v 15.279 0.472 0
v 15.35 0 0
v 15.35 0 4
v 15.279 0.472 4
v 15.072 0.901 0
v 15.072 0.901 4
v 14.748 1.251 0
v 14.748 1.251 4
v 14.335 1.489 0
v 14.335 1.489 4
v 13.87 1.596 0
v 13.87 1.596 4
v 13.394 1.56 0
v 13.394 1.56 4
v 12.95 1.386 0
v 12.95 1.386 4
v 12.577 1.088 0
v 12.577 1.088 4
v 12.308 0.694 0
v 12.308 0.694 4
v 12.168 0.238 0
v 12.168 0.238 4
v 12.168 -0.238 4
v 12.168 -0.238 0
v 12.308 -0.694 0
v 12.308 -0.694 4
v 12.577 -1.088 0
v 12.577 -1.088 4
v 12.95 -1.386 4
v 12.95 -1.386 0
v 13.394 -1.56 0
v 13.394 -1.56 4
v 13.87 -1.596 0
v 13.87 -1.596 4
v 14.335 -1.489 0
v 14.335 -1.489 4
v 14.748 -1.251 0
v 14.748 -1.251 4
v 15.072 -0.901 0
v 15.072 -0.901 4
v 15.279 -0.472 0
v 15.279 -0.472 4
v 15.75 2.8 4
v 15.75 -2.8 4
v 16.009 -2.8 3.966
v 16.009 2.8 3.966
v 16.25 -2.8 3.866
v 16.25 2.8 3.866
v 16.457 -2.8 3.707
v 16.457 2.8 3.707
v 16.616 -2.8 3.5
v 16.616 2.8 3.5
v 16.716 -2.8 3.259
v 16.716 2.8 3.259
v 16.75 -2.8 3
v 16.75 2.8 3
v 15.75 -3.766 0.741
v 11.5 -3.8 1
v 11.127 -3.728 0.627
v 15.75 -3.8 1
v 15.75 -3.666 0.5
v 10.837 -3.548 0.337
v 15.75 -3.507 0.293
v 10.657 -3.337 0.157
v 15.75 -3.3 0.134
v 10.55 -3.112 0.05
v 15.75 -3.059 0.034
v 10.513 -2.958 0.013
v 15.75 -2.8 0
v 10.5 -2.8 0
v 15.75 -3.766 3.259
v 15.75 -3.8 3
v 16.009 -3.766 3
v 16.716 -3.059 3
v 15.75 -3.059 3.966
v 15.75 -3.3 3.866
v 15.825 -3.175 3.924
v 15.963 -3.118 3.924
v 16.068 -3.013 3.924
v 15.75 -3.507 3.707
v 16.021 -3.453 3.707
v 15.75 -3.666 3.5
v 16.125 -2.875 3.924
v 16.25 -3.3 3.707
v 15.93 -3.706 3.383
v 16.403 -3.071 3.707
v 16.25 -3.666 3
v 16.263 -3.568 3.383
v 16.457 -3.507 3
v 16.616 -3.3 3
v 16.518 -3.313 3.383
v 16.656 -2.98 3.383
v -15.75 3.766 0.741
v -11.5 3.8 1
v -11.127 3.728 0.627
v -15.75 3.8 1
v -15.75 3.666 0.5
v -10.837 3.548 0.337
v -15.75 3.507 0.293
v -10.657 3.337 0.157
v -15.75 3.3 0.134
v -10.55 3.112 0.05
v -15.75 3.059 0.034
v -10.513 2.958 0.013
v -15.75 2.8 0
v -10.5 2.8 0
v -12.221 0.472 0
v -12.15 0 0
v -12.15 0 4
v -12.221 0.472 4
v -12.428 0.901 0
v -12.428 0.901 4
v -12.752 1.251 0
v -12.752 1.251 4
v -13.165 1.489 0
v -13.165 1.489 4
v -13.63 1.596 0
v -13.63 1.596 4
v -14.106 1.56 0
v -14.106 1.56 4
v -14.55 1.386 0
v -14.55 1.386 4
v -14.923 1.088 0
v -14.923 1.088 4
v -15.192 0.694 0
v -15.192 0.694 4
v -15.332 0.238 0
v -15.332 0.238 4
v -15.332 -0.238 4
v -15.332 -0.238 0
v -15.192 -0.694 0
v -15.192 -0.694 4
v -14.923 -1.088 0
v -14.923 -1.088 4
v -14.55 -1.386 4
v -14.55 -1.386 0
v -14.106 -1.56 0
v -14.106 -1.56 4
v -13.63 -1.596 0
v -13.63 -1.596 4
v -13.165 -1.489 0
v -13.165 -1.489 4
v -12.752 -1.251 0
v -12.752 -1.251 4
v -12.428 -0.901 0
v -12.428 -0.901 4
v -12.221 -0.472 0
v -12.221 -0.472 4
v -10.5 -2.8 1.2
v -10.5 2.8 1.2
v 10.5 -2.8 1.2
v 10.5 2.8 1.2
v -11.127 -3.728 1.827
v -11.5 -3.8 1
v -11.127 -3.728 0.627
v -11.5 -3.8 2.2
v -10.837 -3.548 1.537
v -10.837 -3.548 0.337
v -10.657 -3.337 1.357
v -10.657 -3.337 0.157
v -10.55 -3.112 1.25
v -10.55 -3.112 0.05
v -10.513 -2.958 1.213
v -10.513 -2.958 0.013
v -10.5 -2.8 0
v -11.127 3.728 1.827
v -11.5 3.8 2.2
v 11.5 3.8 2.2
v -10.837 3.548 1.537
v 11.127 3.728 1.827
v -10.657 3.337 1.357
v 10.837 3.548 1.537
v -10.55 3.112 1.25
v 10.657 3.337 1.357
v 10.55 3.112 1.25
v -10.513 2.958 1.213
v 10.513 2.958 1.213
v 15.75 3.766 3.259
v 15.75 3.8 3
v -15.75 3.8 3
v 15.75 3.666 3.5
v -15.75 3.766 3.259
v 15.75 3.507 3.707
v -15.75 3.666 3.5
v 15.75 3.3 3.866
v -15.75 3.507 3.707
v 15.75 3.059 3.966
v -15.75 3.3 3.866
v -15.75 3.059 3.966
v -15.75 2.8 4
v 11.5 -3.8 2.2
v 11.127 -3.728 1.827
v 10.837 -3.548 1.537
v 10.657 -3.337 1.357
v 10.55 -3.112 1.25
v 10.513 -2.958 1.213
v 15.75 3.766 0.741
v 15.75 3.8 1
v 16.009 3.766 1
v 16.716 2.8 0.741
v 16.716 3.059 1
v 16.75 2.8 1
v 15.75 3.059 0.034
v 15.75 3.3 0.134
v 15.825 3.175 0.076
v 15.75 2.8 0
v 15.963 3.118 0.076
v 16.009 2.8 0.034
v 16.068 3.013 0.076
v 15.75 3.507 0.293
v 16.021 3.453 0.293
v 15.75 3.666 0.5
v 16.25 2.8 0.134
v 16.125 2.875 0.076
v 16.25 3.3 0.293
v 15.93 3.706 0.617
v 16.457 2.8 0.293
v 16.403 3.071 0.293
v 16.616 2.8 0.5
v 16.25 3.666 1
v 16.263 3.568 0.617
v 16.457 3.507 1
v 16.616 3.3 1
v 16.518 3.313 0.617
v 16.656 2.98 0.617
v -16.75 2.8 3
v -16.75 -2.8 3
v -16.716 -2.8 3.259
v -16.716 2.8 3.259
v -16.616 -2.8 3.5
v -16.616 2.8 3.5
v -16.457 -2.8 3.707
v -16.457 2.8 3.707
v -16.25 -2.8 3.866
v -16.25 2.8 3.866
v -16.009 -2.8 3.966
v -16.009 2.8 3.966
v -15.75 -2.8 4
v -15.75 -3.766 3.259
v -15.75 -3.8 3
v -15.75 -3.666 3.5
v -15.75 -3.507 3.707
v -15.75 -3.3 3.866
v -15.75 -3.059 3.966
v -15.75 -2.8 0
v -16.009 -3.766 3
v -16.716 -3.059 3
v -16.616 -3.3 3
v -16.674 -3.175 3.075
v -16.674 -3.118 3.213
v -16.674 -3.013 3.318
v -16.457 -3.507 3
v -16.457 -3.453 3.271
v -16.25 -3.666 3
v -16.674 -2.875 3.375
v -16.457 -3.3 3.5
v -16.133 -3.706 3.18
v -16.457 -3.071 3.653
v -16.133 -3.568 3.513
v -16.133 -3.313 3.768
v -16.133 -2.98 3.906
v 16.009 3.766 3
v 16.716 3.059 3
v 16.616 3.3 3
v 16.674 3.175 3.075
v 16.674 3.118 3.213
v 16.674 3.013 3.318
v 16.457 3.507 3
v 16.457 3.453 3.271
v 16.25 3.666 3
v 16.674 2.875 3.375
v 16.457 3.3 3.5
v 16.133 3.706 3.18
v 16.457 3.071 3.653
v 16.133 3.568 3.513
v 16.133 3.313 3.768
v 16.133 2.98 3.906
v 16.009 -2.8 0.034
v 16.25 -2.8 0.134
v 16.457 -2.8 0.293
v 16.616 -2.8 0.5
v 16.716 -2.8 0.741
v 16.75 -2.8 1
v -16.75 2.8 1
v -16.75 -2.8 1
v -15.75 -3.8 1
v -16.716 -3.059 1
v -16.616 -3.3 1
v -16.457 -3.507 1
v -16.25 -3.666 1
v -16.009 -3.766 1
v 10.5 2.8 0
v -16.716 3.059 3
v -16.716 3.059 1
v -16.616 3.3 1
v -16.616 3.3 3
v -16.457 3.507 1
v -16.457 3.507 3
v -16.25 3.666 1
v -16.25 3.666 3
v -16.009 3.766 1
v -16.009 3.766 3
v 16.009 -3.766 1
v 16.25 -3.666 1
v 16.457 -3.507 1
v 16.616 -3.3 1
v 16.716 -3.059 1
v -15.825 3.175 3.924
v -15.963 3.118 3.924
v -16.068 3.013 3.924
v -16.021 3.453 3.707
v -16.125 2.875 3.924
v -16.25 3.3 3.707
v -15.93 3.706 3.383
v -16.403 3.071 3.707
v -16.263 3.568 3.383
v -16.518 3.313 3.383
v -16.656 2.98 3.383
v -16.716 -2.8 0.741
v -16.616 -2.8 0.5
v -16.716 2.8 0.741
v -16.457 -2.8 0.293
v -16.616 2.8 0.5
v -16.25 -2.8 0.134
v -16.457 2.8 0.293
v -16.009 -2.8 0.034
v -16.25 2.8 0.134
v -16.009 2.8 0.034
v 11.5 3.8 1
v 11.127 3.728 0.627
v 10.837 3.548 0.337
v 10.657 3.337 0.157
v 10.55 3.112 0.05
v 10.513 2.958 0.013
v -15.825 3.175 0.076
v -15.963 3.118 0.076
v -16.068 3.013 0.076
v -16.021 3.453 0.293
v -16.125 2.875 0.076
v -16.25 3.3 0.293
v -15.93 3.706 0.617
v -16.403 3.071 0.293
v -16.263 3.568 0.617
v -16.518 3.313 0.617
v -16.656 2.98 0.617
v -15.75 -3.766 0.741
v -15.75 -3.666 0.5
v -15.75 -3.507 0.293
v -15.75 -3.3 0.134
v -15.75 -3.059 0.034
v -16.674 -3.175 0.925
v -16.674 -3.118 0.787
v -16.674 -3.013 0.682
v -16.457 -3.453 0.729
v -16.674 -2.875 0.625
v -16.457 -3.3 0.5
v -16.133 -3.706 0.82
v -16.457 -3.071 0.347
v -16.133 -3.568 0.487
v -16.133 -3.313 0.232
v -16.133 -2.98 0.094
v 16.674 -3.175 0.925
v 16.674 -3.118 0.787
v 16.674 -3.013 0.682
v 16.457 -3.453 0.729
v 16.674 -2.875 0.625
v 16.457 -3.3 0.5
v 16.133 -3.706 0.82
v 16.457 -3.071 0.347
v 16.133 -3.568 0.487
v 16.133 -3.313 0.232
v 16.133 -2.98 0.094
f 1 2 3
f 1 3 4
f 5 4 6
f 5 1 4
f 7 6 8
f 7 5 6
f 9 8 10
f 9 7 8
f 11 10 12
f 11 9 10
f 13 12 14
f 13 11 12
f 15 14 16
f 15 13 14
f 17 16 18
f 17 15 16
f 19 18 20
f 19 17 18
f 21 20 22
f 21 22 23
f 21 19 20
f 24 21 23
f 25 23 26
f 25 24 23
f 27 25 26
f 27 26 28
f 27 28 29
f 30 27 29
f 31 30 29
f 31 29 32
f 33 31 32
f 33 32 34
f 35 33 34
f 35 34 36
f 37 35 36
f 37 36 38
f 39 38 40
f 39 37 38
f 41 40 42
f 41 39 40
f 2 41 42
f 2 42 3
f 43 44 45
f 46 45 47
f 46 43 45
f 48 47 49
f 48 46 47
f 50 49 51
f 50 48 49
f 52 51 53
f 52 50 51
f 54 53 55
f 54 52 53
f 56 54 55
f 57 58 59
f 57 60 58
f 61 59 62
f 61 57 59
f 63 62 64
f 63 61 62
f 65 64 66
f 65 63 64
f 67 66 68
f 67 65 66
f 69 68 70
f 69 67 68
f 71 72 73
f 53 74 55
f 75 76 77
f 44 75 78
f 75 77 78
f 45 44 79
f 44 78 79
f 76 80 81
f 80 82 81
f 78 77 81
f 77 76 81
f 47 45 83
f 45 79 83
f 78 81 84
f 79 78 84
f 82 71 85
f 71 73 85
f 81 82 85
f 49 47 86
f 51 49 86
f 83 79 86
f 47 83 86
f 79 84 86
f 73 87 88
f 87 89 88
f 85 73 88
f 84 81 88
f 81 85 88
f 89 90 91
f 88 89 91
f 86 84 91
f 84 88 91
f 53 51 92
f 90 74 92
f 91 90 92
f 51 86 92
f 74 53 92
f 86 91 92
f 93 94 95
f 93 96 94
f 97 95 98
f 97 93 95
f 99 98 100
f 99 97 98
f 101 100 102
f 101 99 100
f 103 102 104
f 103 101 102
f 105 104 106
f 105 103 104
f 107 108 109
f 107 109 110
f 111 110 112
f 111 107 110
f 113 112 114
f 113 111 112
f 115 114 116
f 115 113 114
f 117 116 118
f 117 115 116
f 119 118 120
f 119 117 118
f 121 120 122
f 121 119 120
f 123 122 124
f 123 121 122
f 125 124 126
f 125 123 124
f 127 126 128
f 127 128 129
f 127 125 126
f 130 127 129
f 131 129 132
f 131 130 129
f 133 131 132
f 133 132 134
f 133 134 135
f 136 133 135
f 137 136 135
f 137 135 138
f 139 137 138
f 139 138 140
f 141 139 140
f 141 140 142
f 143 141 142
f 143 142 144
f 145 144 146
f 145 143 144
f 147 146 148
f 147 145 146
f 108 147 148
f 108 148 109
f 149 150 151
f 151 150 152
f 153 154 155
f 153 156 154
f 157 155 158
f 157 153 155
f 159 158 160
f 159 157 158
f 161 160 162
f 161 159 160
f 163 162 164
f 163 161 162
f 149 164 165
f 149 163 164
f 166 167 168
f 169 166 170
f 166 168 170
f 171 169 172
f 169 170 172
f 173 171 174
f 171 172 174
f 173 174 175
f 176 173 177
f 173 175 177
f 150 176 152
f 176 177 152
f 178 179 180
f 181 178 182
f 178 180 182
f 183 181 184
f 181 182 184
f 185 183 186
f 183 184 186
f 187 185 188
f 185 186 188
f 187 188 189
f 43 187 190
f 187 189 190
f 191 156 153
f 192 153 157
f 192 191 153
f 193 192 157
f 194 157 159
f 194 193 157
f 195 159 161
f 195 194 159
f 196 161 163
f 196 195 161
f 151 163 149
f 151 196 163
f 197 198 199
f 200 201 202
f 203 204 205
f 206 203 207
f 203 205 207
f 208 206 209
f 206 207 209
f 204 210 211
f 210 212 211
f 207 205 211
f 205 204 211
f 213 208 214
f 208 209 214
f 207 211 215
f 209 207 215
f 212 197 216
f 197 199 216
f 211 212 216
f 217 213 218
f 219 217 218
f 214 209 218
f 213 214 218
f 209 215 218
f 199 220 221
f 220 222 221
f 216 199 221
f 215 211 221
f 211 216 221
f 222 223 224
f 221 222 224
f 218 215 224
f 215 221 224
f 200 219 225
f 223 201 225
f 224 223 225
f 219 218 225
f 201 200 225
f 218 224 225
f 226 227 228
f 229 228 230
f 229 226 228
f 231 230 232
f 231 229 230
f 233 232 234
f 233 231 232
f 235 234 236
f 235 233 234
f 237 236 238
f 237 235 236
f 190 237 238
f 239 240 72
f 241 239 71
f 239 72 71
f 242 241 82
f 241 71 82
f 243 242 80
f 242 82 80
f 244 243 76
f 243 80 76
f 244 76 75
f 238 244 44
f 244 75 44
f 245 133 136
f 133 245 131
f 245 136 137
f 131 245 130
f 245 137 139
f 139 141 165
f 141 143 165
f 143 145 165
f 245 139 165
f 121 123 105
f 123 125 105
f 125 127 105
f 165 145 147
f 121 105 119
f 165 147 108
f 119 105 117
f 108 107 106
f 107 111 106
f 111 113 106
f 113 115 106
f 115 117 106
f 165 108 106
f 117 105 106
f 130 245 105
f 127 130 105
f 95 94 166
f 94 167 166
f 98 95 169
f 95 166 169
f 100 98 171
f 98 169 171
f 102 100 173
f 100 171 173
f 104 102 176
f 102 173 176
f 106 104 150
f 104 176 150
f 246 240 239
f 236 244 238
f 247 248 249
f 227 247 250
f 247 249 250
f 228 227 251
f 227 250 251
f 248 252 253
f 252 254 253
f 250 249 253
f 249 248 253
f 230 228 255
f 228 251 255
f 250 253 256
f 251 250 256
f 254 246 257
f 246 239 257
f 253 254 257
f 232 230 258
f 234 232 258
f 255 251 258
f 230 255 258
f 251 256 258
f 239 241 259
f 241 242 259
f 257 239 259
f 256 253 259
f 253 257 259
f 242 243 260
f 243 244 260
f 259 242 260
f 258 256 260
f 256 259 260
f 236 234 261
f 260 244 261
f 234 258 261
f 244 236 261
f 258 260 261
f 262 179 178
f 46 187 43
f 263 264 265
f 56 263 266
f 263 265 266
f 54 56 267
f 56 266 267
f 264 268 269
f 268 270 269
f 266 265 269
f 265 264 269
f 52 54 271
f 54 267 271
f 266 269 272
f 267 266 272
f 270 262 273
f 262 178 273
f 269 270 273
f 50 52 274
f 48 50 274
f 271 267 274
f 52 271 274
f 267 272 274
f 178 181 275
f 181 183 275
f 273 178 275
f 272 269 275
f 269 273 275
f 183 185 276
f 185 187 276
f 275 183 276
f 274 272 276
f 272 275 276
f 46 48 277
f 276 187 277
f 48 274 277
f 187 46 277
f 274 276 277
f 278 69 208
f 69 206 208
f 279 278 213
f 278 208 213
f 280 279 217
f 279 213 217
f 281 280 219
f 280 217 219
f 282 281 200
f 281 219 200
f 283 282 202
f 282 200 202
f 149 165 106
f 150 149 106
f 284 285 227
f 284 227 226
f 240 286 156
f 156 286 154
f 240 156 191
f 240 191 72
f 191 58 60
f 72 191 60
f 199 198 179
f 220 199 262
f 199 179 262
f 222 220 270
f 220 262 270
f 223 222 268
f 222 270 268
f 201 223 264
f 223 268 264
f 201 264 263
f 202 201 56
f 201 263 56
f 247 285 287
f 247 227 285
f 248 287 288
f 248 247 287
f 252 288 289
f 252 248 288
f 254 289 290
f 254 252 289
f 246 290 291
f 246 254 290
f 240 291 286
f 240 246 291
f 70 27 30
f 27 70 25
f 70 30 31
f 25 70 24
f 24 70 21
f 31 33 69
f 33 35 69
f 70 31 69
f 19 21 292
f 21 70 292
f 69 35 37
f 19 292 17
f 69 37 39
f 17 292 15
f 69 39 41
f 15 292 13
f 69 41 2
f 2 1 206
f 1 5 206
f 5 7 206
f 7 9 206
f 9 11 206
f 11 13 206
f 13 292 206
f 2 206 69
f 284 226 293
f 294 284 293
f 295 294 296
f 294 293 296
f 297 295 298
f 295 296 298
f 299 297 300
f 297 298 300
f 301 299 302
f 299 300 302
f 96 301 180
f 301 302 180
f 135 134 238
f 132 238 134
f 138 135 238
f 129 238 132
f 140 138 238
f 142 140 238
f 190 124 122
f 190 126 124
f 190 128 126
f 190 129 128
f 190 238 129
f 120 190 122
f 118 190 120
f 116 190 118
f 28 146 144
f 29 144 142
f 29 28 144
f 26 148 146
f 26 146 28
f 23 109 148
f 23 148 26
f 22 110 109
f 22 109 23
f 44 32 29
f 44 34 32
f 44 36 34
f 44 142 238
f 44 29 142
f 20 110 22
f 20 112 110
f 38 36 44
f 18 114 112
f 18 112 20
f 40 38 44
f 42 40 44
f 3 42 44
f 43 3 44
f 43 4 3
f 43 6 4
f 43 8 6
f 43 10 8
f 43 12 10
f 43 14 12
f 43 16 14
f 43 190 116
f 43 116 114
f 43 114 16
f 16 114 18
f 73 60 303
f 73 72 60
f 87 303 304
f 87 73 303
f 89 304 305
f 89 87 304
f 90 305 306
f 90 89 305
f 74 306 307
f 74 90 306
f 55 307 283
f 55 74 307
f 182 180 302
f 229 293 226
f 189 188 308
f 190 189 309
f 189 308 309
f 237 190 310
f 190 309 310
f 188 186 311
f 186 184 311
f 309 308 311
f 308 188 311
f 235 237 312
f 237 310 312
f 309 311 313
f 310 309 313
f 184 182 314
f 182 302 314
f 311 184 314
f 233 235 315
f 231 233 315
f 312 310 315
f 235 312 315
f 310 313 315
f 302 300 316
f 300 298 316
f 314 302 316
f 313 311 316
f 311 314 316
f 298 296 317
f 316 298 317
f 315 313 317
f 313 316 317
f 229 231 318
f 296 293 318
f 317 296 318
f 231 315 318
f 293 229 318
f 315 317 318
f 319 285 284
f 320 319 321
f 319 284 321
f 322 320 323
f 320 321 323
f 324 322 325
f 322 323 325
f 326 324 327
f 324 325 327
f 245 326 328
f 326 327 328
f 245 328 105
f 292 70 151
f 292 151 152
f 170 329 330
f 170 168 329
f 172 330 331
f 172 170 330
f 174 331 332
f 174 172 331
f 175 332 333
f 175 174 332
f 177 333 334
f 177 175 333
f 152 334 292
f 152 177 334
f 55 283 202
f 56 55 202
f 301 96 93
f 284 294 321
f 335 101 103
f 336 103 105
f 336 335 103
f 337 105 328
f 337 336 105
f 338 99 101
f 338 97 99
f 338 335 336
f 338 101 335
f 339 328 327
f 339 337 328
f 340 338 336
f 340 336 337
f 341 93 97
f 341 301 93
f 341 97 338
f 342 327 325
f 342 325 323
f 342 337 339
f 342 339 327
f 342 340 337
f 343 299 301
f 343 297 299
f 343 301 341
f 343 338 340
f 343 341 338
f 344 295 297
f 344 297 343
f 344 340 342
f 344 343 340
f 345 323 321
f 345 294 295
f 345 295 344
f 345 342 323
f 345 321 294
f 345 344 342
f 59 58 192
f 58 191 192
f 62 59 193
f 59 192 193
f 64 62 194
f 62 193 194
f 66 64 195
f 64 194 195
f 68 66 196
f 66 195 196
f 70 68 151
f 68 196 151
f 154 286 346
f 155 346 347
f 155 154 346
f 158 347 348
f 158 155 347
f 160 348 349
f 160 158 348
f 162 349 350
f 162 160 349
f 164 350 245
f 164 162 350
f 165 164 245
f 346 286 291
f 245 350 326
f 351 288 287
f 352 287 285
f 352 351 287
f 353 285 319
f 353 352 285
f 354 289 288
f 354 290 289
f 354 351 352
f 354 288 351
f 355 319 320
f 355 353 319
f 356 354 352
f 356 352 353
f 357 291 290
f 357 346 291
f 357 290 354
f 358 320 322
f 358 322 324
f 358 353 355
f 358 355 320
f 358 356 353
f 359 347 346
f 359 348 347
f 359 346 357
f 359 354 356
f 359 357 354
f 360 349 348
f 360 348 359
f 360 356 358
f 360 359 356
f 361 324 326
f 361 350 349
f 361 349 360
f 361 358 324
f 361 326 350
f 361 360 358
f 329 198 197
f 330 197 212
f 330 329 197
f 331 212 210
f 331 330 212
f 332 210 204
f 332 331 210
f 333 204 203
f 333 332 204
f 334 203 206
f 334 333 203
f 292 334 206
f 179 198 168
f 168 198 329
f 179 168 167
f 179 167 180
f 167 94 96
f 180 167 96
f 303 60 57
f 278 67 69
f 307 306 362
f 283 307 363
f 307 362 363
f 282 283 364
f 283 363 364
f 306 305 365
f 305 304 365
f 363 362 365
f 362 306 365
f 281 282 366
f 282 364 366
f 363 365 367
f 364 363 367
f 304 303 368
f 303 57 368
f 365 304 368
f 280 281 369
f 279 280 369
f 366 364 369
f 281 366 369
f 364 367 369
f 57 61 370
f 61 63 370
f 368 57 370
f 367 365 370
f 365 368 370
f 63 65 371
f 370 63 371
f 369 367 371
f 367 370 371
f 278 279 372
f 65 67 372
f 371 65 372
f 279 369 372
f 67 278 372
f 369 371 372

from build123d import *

# Parameters (mm, degrees)
F0_W     = 6
F0_H     = 7.6
F0_R     = 1.6
F0_W_2   = 0.25
F0_W_3   = 21
F1_DEPTH = 4
F2_DEPTH = 1.2
F3_R     = 1


with BuildPart() as f1:
    # F0 (on Top) → F1 (new body)
    with BuildSketch(Plane.XY):
        with Locations((-13.75, 0)):
            Rectangle(F0_W, F0_H)
        with Locations((-13.75, 0)):
            Circle(F0_R, mode=Mode.SUBTRACT)
        with Locations((13.75, 0)):
            Rectangle(F0_W, F0_H)
        with Locations((13.75, 0)):
            Circle(F0_R, mode=Mode.SUBTRACT)
        with Locations((-10.625, 0)):
            Rectangle(F0_W_2, F0_H)
        Rectangle(F0_W_3, F0_H)
        with Locations((10.625, 0)):
            Rectangle(F0_W_2, F0_H)
    extrude(amount=F1_DEPTH)

    # F0 (on Top) → F2 (cut)
    with BuildSketch(Plane.XY):
        Rectangle(F0_W_3, F0_H)
    extrude(amount=F2_DEPTH, mode=Mode.SUBTRACT)

    # F3
    f3_edges = [f1.edges().sort_by_distance(p)[0] for p in [
        (-13.625, -3.8, 0),
        (-10.5, -3.8, 0.6),
        (0, -3.8, 1.2),
        (10.5, -3.8, 0.6),
        (13.625, -3.8, 0),
        (16.75, -3.8, 2),
        (0, -3.8, 4),
        (-16.75, -3.8, 2),
        (-16.75, 3.8, 2),
        (0, 3.8, 4),
        (16.75, 3.8, 2),
        (13.625, 3.8, 0),
        (10.5, 3.8, 0.6),
        (0, 3.8, 1.2),
        (-10.5, 3.8, 0.6),
        (-13.625, 3.8, 0),
        (16.75, 0, 0),
        (16.75, 0, 4),
        (-16.75, 0, 0),
        (-16.75, 0, 4),
    ]]
    fillet(f3_edges, radius=F3_R)


solid = f1.part
